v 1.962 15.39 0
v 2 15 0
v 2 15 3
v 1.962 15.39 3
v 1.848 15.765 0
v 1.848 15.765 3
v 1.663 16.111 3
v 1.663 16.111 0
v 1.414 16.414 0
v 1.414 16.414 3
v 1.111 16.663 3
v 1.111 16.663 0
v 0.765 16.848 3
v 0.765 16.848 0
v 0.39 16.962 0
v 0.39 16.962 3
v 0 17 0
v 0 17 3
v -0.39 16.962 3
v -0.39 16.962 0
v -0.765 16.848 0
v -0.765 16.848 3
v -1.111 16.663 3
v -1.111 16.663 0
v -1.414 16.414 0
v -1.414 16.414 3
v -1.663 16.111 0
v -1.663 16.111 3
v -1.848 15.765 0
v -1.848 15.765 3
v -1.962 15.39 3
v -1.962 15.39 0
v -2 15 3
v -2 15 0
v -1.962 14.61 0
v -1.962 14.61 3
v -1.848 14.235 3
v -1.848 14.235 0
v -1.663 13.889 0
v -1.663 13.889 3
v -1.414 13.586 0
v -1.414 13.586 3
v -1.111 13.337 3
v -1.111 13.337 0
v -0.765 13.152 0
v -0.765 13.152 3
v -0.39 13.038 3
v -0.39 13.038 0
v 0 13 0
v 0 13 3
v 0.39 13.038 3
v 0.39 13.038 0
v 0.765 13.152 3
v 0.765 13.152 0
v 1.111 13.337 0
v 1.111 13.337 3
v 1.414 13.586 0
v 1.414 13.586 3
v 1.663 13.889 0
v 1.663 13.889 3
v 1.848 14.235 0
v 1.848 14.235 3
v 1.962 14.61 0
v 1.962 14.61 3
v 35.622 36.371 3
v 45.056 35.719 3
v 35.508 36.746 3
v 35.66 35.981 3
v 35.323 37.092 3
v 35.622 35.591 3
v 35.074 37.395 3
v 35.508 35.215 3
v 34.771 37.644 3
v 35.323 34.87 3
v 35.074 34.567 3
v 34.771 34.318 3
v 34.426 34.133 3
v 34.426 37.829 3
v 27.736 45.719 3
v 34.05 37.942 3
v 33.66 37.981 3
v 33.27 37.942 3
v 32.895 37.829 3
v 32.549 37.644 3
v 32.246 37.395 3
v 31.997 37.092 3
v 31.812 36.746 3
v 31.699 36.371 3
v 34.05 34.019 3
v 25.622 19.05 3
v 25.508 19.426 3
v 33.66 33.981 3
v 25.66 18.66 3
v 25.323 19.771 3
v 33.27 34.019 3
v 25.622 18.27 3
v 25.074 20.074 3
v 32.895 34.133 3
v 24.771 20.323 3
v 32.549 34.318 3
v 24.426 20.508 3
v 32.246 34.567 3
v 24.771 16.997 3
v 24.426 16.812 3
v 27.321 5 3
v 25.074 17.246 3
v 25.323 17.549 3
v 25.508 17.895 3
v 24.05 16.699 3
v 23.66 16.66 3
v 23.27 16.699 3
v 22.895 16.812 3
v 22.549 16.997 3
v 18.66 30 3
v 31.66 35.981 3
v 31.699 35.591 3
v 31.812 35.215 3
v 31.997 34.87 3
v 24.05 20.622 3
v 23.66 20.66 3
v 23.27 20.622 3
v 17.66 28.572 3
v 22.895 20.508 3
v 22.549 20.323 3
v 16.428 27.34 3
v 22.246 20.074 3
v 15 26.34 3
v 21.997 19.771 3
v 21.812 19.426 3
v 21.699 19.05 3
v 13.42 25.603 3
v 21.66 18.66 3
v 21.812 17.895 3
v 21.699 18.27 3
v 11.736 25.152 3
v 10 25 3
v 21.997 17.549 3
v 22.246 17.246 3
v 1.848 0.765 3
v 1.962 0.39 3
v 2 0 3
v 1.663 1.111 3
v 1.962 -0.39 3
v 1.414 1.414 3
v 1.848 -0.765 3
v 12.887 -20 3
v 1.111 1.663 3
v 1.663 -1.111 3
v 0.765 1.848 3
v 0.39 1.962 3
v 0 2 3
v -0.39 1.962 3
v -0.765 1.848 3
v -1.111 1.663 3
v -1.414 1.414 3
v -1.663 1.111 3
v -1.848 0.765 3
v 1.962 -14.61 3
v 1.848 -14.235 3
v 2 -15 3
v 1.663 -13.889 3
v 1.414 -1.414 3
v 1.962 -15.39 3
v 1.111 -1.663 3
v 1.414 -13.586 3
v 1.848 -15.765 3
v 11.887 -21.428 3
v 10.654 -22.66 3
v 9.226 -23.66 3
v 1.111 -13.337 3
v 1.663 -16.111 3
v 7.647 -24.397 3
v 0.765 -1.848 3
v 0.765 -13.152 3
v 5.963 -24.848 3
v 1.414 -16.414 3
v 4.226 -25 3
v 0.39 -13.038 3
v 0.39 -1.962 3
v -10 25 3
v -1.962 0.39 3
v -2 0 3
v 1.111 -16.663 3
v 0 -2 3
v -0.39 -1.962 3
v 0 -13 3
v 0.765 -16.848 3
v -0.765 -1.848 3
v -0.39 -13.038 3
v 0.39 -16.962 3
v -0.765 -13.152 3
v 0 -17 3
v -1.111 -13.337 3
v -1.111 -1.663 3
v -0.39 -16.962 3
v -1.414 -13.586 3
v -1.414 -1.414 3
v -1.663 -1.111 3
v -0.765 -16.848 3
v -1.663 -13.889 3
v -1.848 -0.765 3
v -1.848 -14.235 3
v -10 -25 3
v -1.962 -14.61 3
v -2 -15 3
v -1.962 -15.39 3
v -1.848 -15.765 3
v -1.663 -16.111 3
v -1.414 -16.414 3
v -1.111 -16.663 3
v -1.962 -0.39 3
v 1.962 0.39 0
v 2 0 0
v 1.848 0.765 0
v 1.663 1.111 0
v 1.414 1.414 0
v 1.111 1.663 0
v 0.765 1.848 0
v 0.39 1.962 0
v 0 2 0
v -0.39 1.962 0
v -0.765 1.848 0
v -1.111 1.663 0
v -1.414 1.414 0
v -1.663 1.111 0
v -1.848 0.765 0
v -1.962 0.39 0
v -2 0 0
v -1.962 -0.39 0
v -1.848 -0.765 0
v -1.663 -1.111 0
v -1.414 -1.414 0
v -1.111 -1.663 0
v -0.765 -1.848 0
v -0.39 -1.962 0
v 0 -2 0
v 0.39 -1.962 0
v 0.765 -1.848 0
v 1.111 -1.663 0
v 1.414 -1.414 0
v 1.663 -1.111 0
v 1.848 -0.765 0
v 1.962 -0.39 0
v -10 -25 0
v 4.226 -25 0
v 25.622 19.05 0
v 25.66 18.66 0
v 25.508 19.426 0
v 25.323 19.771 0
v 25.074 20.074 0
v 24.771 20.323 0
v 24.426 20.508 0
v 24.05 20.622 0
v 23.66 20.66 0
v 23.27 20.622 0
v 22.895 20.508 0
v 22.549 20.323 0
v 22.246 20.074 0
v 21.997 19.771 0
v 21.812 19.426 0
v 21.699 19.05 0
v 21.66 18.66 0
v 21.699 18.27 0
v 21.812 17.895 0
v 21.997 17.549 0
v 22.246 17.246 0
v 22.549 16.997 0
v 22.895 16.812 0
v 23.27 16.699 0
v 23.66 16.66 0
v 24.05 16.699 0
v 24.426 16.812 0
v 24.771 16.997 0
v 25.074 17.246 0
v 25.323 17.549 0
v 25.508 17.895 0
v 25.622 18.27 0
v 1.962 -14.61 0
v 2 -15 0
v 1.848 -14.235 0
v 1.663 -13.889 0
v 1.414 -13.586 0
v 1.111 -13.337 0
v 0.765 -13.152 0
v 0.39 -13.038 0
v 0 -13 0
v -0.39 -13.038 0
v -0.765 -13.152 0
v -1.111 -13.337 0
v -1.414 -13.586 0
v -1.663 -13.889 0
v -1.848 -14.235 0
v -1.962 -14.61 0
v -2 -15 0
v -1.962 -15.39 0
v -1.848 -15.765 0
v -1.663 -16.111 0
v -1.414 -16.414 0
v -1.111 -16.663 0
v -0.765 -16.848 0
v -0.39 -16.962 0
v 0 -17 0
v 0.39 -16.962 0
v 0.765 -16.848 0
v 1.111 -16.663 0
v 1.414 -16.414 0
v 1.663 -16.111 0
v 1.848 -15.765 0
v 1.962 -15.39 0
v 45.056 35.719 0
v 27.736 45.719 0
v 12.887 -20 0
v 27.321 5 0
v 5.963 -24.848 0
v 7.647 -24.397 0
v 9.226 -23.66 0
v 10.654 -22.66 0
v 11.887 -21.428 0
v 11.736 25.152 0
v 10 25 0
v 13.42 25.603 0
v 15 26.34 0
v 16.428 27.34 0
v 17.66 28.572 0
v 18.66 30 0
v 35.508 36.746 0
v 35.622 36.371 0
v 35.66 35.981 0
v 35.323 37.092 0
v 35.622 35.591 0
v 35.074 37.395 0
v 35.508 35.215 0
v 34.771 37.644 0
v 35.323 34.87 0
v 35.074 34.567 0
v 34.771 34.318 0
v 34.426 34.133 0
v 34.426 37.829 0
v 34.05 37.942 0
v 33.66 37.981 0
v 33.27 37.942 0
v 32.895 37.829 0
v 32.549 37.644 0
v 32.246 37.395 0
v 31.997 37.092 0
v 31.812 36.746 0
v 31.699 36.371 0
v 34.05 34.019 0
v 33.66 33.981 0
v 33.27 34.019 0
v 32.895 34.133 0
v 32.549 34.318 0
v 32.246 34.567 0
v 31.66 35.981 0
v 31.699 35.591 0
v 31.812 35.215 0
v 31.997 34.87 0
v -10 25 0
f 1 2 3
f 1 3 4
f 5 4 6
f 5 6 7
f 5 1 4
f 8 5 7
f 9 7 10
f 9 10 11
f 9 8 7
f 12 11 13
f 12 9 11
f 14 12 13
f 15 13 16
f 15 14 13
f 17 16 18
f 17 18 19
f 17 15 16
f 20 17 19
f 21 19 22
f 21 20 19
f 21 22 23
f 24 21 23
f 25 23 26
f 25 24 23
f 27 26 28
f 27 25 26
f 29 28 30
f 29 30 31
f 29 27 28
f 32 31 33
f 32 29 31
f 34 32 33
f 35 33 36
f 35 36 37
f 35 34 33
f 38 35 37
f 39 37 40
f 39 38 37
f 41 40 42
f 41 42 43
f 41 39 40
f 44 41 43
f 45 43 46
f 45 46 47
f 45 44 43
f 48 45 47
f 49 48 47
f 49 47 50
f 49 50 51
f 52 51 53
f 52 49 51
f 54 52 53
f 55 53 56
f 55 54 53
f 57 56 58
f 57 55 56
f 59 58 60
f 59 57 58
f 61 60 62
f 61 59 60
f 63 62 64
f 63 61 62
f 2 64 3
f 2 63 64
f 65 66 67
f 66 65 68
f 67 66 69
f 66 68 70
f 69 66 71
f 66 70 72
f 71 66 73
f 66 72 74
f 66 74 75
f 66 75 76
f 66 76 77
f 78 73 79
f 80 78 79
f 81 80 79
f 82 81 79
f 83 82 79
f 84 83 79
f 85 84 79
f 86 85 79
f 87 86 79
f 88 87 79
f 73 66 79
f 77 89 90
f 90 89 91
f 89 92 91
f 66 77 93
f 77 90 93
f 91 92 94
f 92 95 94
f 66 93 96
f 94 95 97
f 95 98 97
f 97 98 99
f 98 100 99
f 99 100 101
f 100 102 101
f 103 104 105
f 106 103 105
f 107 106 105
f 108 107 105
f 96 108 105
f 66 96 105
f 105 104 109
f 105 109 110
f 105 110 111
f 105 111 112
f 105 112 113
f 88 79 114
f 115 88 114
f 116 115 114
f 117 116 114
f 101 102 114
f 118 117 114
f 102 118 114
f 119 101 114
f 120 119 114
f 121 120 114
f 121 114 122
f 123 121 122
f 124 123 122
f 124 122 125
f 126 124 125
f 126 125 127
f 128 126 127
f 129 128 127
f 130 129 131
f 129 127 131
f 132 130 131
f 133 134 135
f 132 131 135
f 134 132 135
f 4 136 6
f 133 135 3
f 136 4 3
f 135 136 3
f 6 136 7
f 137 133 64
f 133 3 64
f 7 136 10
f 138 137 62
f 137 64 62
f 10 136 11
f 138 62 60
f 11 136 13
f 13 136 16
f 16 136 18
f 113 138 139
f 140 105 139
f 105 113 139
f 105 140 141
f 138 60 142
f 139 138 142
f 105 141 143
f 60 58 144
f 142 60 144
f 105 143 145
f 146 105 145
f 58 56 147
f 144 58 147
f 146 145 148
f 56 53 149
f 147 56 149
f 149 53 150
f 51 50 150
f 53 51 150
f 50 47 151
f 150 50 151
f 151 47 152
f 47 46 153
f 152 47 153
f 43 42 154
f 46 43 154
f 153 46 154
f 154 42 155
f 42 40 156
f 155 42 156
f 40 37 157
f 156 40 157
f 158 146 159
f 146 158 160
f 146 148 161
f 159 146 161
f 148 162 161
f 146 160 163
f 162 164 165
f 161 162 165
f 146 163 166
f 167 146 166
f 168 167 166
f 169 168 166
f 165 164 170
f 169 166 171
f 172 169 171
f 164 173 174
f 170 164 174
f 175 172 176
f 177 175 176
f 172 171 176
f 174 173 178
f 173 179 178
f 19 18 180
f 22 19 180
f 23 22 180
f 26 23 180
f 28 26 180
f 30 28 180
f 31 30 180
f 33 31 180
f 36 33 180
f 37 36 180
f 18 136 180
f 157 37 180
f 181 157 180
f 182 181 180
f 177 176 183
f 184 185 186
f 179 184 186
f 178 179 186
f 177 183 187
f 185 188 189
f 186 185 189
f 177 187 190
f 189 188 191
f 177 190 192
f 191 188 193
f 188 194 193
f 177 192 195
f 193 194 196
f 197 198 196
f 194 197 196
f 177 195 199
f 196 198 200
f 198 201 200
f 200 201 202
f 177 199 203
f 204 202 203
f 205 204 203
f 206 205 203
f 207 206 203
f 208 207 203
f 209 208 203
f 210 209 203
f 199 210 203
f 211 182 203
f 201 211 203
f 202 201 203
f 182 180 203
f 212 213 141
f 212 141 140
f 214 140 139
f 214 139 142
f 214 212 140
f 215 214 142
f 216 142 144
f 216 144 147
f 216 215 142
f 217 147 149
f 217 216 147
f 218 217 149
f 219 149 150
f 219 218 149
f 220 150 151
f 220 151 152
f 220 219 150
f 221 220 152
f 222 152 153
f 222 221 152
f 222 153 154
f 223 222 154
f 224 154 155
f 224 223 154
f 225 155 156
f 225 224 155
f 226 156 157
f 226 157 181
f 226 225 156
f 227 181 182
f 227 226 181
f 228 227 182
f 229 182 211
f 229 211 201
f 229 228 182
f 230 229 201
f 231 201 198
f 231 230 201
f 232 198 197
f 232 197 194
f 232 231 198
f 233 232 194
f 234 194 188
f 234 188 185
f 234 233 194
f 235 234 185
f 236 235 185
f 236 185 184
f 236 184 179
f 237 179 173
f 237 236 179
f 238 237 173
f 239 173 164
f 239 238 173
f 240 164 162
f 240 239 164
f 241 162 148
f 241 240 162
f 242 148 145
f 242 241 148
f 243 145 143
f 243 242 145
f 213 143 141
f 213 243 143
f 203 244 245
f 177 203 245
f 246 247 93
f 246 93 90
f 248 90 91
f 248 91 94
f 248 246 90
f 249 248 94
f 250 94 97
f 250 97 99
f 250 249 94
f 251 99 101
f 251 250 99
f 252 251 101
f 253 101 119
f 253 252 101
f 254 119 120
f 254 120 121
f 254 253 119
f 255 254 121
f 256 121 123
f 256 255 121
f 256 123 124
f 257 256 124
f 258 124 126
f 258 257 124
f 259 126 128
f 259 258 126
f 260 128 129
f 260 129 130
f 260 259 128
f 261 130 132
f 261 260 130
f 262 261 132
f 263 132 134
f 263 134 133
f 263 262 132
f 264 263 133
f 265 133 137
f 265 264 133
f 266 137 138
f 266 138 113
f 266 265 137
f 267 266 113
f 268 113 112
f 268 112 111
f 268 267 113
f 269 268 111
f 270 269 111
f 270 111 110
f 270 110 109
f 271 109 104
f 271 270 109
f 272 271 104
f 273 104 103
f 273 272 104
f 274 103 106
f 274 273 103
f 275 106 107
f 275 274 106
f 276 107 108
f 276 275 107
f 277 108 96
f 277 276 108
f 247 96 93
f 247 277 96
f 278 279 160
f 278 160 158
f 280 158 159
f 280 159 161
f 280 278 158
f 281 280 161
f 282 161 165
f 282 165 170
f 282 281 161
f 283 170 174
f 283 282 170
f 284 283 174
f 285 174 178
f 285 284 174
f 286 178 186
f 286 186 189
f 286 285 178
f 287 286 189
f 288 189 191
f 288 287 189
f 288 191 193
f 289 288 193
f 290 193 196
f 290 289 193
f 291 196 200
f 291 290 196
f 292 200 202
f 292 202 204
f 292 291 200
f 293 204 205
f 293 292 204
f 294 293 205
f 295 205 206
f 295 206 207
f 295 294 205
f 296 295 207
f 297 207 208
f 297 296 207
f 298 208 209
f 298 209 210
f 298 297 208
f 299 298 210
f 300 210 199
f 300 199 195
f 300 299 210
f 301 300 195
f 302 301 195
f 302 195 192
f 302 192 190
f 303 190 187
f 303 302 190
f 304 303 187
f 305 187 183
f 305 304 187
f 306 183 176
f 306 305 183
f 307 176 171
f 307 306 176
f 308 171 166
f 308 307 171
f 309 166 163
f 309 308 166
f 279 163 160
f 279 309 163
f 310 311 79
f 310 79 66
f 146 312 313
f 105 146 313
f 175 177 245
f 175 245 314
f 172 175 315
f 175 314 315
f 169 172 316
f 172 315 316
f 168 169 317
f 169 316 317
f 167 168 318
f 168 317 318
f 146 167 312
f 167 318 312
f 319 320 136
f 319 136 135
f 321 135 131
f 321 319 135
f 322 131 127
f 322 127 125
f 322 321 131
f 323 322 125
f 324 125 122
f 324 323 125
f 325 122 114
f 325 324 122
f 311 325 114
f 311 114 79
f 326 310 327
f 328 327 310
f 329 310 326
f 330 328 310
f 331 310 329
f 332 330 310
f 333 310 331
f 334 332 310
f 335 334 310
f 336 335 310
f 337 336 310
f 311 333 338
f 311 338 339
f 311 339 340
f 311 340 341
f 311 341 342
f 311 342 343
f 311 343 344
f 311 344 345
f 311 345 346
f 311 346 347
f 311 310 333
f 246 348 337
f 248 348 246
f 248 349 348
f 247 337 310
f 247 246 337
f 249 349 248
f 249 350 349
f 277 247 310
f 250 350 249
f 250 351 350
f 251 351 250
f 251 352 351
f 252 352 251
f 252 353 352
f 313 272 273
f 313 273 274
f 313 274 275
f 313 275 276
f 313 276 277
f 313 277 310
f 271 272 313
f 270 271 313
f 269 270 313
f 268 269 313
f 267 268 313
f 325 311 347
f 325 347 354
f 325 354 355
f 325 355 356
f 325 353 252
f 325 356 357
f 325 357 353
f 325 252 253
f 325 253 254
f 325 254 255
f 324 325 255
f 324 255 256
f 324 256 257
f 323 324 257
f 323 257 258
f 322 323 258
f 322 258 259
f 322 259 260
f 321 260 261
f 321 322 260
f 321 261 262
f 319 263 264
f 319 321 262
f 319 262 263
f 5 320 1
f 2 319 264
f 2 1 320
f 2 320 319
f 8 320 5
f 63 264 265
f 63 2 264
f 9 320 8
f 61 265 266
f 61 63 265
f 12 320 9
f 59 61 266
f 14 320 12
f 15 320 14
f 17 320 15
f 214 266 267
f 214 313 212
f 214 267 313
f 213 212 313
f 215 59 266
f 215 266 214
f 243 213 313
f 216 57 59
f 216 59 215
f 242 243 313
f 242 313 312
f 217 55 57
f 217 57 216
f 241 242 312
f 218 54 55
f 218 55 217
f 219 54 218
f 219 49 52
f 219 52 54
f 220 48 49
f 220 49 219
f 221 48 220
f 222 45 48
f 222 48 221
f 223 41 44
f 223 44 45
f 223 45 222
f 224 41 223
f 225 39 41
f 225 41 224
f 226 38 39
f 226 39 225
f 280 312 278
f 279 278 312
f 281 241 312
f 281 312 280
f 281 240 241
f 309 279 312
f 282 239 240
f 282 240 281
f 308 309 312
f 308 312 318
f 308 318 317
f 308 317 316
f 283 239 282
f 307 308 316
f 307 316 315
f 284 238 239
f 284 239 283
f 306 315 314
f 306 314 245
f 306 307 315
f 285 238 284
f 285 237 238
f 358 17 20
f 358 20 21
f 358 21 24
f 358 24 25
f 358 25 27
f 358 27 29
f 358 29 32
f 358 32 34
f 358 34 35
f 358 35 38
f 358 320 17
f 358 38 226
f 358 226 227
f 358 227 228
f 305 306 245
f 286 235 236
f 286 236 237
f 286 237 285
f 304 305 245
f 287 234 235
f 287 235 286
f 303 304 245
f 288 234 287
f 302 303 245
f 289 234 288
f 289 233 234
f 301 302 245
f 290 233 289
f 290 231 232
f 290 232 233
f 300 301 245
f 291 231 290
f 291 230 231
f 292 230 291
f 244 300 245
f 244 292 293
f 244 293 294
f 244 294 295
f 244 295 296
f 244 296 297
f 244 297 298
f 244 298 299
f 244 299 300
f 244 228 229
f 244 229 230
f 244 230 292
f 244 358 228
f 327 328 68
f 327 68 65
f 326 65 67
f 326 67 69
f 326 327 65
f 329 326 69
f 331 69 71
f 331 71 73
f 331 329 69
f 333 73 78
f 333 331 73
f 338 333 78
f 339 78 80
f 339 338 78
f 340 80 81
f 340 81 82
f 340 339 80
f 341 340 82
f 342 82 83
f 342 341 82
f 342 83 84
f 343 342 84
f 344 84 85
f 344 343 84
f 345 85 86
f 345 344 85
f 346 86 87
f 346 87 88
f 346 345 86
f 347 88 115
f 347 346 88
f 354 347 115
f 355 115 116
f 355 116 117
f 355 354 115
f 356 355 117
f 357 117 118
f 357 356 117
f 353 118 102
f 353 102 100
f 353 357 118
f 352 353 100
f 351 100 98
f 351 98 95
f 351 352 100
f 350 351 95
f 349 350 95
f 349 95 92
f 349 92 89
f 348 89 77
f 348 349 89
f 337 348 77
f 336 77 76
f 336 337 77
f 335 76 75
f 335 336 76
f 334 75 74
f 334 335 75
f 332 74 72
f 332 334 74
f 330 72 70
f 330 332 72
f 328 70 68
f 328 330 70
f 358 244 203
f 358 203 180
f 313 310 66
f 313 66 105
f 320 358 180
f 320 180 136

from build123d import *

# Parameters (mm, degrees)
SKETCH_1_R      = 2
SKETCH_1_W      = 20
SKETCH_1_H      = 50
EXTRUDE_1_DEPTH = 3
FILLET_1_R      = 10


with BuildPart() as part:
    # 草图1 → 凸台-拉伸1 (new body)
    # profile 1 of 3: a face of its own
    with BuildSketch(Plane.XY):
        Polygon((27.320508076, 5), (10, 15), (10, -25), align=None)
    # profile 2 of 3: a face of its own
    with BuildSketch(Plane.XY):
        Polygon((27.735682985, 45.719104037), (45.05619106, 35.719104037), (27.320508076, 5), (10, 15), align=None)
        with Locations((33.660254038, 35.980762114)):
            Circle(SKETCH_1_R, mode=Mode.SUBTRACT)
        with Locations((23.660254038, 18.660254038)):
            Circle(SKETCH_1_R, mode=Mode.SUBTRACT)
    # profile 3 of 3: a face of its own
    with BuildSketch(Plane.XY):
        Rectangle(SKETCH_1_W, SKETCH_1_H)
        Circle(SKETCH_1_R, mode=Mode.SUBTRACT)
        with Locations((0, -15)):
            Circle(SKETCH_1_R, mode=Mode.SUBTRACT)
        with Locations((0, 15)):
            Circle(SKETCH_1_R, mode=Mode.SUBTRACT)
    extrude(amount=EXTRUDE_1_DEPTH)

    # 圆角1
    # the kernel refuses this fillet: 10 mm, written as the material it adds along each edge
    with BuildSketch(Plane(origin=(10, 15, 0), x_dir=(0.49999999999999756, 0.86602540378444, 0), z_dir=(0, 0, 1))) as fillet_1_piece_1:
        with BuildLine():
            CenterArc((17.320508076, 10), FILLET_1_R, 210, 60)
            Line((8.660254038, 5), (0, 0))
            Line((0, 0), (17.320508076, 0))
        make_face()
    extrude(amount=3)
    # the kernel refuses this fillet: 10 mm, written as the material it takes off along each edge
    with BuildSketch(Plane(origin=(10, -25, -14.43375673), x_dir=(0.49999999999999745, 0.86602540378444, 0), z_dir=(0, 0, 1))) as fillet_1_2_piece_1:
        with BuildLine():
            CenterArc((FILLET_1_R * 0.57735026919, FILLET_1_R), FILLET_1_R, 210, 60)
            Line((-FILLET_1_R * 0.288675134595, FILLET_1_R * 0.5), (0, 0))
            Line((0, 0), (FILLET_1_R * 0.57735026919, 0))
        make_face()
    extrude(amount=31.867513459, mode=Mode.SUBTRACT)


solid = part.part
